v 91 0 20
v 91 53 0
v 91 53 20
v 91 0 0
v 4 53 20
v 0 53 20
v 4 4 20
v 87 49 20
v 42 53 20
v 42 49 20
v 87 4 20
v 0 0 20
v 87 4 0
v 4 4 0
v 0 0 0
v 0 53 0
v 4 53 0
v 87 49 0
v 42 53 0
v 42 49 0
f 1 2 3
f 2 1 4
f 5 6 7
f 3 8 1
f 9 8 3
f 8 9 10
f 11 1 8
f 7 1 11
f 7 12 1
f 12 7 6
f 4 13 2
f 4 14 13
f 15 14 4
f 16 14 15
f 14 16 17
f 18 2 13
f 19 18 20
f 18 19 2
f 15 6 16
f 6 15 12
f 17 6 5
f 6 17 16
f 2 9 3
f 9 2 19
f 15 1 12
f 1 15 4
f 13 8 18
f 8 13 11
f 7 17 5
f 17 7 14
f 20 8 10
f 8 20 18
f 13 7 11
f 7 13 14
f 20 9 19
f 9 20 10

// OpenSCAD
difference() {
    cube([91, 53, 20]); // 38 + 45 = 83 then + 8
    translate([4,4,0]) cube([83,45,20]);
    translate([4,4,0]) cube([38,49,20]);
}
